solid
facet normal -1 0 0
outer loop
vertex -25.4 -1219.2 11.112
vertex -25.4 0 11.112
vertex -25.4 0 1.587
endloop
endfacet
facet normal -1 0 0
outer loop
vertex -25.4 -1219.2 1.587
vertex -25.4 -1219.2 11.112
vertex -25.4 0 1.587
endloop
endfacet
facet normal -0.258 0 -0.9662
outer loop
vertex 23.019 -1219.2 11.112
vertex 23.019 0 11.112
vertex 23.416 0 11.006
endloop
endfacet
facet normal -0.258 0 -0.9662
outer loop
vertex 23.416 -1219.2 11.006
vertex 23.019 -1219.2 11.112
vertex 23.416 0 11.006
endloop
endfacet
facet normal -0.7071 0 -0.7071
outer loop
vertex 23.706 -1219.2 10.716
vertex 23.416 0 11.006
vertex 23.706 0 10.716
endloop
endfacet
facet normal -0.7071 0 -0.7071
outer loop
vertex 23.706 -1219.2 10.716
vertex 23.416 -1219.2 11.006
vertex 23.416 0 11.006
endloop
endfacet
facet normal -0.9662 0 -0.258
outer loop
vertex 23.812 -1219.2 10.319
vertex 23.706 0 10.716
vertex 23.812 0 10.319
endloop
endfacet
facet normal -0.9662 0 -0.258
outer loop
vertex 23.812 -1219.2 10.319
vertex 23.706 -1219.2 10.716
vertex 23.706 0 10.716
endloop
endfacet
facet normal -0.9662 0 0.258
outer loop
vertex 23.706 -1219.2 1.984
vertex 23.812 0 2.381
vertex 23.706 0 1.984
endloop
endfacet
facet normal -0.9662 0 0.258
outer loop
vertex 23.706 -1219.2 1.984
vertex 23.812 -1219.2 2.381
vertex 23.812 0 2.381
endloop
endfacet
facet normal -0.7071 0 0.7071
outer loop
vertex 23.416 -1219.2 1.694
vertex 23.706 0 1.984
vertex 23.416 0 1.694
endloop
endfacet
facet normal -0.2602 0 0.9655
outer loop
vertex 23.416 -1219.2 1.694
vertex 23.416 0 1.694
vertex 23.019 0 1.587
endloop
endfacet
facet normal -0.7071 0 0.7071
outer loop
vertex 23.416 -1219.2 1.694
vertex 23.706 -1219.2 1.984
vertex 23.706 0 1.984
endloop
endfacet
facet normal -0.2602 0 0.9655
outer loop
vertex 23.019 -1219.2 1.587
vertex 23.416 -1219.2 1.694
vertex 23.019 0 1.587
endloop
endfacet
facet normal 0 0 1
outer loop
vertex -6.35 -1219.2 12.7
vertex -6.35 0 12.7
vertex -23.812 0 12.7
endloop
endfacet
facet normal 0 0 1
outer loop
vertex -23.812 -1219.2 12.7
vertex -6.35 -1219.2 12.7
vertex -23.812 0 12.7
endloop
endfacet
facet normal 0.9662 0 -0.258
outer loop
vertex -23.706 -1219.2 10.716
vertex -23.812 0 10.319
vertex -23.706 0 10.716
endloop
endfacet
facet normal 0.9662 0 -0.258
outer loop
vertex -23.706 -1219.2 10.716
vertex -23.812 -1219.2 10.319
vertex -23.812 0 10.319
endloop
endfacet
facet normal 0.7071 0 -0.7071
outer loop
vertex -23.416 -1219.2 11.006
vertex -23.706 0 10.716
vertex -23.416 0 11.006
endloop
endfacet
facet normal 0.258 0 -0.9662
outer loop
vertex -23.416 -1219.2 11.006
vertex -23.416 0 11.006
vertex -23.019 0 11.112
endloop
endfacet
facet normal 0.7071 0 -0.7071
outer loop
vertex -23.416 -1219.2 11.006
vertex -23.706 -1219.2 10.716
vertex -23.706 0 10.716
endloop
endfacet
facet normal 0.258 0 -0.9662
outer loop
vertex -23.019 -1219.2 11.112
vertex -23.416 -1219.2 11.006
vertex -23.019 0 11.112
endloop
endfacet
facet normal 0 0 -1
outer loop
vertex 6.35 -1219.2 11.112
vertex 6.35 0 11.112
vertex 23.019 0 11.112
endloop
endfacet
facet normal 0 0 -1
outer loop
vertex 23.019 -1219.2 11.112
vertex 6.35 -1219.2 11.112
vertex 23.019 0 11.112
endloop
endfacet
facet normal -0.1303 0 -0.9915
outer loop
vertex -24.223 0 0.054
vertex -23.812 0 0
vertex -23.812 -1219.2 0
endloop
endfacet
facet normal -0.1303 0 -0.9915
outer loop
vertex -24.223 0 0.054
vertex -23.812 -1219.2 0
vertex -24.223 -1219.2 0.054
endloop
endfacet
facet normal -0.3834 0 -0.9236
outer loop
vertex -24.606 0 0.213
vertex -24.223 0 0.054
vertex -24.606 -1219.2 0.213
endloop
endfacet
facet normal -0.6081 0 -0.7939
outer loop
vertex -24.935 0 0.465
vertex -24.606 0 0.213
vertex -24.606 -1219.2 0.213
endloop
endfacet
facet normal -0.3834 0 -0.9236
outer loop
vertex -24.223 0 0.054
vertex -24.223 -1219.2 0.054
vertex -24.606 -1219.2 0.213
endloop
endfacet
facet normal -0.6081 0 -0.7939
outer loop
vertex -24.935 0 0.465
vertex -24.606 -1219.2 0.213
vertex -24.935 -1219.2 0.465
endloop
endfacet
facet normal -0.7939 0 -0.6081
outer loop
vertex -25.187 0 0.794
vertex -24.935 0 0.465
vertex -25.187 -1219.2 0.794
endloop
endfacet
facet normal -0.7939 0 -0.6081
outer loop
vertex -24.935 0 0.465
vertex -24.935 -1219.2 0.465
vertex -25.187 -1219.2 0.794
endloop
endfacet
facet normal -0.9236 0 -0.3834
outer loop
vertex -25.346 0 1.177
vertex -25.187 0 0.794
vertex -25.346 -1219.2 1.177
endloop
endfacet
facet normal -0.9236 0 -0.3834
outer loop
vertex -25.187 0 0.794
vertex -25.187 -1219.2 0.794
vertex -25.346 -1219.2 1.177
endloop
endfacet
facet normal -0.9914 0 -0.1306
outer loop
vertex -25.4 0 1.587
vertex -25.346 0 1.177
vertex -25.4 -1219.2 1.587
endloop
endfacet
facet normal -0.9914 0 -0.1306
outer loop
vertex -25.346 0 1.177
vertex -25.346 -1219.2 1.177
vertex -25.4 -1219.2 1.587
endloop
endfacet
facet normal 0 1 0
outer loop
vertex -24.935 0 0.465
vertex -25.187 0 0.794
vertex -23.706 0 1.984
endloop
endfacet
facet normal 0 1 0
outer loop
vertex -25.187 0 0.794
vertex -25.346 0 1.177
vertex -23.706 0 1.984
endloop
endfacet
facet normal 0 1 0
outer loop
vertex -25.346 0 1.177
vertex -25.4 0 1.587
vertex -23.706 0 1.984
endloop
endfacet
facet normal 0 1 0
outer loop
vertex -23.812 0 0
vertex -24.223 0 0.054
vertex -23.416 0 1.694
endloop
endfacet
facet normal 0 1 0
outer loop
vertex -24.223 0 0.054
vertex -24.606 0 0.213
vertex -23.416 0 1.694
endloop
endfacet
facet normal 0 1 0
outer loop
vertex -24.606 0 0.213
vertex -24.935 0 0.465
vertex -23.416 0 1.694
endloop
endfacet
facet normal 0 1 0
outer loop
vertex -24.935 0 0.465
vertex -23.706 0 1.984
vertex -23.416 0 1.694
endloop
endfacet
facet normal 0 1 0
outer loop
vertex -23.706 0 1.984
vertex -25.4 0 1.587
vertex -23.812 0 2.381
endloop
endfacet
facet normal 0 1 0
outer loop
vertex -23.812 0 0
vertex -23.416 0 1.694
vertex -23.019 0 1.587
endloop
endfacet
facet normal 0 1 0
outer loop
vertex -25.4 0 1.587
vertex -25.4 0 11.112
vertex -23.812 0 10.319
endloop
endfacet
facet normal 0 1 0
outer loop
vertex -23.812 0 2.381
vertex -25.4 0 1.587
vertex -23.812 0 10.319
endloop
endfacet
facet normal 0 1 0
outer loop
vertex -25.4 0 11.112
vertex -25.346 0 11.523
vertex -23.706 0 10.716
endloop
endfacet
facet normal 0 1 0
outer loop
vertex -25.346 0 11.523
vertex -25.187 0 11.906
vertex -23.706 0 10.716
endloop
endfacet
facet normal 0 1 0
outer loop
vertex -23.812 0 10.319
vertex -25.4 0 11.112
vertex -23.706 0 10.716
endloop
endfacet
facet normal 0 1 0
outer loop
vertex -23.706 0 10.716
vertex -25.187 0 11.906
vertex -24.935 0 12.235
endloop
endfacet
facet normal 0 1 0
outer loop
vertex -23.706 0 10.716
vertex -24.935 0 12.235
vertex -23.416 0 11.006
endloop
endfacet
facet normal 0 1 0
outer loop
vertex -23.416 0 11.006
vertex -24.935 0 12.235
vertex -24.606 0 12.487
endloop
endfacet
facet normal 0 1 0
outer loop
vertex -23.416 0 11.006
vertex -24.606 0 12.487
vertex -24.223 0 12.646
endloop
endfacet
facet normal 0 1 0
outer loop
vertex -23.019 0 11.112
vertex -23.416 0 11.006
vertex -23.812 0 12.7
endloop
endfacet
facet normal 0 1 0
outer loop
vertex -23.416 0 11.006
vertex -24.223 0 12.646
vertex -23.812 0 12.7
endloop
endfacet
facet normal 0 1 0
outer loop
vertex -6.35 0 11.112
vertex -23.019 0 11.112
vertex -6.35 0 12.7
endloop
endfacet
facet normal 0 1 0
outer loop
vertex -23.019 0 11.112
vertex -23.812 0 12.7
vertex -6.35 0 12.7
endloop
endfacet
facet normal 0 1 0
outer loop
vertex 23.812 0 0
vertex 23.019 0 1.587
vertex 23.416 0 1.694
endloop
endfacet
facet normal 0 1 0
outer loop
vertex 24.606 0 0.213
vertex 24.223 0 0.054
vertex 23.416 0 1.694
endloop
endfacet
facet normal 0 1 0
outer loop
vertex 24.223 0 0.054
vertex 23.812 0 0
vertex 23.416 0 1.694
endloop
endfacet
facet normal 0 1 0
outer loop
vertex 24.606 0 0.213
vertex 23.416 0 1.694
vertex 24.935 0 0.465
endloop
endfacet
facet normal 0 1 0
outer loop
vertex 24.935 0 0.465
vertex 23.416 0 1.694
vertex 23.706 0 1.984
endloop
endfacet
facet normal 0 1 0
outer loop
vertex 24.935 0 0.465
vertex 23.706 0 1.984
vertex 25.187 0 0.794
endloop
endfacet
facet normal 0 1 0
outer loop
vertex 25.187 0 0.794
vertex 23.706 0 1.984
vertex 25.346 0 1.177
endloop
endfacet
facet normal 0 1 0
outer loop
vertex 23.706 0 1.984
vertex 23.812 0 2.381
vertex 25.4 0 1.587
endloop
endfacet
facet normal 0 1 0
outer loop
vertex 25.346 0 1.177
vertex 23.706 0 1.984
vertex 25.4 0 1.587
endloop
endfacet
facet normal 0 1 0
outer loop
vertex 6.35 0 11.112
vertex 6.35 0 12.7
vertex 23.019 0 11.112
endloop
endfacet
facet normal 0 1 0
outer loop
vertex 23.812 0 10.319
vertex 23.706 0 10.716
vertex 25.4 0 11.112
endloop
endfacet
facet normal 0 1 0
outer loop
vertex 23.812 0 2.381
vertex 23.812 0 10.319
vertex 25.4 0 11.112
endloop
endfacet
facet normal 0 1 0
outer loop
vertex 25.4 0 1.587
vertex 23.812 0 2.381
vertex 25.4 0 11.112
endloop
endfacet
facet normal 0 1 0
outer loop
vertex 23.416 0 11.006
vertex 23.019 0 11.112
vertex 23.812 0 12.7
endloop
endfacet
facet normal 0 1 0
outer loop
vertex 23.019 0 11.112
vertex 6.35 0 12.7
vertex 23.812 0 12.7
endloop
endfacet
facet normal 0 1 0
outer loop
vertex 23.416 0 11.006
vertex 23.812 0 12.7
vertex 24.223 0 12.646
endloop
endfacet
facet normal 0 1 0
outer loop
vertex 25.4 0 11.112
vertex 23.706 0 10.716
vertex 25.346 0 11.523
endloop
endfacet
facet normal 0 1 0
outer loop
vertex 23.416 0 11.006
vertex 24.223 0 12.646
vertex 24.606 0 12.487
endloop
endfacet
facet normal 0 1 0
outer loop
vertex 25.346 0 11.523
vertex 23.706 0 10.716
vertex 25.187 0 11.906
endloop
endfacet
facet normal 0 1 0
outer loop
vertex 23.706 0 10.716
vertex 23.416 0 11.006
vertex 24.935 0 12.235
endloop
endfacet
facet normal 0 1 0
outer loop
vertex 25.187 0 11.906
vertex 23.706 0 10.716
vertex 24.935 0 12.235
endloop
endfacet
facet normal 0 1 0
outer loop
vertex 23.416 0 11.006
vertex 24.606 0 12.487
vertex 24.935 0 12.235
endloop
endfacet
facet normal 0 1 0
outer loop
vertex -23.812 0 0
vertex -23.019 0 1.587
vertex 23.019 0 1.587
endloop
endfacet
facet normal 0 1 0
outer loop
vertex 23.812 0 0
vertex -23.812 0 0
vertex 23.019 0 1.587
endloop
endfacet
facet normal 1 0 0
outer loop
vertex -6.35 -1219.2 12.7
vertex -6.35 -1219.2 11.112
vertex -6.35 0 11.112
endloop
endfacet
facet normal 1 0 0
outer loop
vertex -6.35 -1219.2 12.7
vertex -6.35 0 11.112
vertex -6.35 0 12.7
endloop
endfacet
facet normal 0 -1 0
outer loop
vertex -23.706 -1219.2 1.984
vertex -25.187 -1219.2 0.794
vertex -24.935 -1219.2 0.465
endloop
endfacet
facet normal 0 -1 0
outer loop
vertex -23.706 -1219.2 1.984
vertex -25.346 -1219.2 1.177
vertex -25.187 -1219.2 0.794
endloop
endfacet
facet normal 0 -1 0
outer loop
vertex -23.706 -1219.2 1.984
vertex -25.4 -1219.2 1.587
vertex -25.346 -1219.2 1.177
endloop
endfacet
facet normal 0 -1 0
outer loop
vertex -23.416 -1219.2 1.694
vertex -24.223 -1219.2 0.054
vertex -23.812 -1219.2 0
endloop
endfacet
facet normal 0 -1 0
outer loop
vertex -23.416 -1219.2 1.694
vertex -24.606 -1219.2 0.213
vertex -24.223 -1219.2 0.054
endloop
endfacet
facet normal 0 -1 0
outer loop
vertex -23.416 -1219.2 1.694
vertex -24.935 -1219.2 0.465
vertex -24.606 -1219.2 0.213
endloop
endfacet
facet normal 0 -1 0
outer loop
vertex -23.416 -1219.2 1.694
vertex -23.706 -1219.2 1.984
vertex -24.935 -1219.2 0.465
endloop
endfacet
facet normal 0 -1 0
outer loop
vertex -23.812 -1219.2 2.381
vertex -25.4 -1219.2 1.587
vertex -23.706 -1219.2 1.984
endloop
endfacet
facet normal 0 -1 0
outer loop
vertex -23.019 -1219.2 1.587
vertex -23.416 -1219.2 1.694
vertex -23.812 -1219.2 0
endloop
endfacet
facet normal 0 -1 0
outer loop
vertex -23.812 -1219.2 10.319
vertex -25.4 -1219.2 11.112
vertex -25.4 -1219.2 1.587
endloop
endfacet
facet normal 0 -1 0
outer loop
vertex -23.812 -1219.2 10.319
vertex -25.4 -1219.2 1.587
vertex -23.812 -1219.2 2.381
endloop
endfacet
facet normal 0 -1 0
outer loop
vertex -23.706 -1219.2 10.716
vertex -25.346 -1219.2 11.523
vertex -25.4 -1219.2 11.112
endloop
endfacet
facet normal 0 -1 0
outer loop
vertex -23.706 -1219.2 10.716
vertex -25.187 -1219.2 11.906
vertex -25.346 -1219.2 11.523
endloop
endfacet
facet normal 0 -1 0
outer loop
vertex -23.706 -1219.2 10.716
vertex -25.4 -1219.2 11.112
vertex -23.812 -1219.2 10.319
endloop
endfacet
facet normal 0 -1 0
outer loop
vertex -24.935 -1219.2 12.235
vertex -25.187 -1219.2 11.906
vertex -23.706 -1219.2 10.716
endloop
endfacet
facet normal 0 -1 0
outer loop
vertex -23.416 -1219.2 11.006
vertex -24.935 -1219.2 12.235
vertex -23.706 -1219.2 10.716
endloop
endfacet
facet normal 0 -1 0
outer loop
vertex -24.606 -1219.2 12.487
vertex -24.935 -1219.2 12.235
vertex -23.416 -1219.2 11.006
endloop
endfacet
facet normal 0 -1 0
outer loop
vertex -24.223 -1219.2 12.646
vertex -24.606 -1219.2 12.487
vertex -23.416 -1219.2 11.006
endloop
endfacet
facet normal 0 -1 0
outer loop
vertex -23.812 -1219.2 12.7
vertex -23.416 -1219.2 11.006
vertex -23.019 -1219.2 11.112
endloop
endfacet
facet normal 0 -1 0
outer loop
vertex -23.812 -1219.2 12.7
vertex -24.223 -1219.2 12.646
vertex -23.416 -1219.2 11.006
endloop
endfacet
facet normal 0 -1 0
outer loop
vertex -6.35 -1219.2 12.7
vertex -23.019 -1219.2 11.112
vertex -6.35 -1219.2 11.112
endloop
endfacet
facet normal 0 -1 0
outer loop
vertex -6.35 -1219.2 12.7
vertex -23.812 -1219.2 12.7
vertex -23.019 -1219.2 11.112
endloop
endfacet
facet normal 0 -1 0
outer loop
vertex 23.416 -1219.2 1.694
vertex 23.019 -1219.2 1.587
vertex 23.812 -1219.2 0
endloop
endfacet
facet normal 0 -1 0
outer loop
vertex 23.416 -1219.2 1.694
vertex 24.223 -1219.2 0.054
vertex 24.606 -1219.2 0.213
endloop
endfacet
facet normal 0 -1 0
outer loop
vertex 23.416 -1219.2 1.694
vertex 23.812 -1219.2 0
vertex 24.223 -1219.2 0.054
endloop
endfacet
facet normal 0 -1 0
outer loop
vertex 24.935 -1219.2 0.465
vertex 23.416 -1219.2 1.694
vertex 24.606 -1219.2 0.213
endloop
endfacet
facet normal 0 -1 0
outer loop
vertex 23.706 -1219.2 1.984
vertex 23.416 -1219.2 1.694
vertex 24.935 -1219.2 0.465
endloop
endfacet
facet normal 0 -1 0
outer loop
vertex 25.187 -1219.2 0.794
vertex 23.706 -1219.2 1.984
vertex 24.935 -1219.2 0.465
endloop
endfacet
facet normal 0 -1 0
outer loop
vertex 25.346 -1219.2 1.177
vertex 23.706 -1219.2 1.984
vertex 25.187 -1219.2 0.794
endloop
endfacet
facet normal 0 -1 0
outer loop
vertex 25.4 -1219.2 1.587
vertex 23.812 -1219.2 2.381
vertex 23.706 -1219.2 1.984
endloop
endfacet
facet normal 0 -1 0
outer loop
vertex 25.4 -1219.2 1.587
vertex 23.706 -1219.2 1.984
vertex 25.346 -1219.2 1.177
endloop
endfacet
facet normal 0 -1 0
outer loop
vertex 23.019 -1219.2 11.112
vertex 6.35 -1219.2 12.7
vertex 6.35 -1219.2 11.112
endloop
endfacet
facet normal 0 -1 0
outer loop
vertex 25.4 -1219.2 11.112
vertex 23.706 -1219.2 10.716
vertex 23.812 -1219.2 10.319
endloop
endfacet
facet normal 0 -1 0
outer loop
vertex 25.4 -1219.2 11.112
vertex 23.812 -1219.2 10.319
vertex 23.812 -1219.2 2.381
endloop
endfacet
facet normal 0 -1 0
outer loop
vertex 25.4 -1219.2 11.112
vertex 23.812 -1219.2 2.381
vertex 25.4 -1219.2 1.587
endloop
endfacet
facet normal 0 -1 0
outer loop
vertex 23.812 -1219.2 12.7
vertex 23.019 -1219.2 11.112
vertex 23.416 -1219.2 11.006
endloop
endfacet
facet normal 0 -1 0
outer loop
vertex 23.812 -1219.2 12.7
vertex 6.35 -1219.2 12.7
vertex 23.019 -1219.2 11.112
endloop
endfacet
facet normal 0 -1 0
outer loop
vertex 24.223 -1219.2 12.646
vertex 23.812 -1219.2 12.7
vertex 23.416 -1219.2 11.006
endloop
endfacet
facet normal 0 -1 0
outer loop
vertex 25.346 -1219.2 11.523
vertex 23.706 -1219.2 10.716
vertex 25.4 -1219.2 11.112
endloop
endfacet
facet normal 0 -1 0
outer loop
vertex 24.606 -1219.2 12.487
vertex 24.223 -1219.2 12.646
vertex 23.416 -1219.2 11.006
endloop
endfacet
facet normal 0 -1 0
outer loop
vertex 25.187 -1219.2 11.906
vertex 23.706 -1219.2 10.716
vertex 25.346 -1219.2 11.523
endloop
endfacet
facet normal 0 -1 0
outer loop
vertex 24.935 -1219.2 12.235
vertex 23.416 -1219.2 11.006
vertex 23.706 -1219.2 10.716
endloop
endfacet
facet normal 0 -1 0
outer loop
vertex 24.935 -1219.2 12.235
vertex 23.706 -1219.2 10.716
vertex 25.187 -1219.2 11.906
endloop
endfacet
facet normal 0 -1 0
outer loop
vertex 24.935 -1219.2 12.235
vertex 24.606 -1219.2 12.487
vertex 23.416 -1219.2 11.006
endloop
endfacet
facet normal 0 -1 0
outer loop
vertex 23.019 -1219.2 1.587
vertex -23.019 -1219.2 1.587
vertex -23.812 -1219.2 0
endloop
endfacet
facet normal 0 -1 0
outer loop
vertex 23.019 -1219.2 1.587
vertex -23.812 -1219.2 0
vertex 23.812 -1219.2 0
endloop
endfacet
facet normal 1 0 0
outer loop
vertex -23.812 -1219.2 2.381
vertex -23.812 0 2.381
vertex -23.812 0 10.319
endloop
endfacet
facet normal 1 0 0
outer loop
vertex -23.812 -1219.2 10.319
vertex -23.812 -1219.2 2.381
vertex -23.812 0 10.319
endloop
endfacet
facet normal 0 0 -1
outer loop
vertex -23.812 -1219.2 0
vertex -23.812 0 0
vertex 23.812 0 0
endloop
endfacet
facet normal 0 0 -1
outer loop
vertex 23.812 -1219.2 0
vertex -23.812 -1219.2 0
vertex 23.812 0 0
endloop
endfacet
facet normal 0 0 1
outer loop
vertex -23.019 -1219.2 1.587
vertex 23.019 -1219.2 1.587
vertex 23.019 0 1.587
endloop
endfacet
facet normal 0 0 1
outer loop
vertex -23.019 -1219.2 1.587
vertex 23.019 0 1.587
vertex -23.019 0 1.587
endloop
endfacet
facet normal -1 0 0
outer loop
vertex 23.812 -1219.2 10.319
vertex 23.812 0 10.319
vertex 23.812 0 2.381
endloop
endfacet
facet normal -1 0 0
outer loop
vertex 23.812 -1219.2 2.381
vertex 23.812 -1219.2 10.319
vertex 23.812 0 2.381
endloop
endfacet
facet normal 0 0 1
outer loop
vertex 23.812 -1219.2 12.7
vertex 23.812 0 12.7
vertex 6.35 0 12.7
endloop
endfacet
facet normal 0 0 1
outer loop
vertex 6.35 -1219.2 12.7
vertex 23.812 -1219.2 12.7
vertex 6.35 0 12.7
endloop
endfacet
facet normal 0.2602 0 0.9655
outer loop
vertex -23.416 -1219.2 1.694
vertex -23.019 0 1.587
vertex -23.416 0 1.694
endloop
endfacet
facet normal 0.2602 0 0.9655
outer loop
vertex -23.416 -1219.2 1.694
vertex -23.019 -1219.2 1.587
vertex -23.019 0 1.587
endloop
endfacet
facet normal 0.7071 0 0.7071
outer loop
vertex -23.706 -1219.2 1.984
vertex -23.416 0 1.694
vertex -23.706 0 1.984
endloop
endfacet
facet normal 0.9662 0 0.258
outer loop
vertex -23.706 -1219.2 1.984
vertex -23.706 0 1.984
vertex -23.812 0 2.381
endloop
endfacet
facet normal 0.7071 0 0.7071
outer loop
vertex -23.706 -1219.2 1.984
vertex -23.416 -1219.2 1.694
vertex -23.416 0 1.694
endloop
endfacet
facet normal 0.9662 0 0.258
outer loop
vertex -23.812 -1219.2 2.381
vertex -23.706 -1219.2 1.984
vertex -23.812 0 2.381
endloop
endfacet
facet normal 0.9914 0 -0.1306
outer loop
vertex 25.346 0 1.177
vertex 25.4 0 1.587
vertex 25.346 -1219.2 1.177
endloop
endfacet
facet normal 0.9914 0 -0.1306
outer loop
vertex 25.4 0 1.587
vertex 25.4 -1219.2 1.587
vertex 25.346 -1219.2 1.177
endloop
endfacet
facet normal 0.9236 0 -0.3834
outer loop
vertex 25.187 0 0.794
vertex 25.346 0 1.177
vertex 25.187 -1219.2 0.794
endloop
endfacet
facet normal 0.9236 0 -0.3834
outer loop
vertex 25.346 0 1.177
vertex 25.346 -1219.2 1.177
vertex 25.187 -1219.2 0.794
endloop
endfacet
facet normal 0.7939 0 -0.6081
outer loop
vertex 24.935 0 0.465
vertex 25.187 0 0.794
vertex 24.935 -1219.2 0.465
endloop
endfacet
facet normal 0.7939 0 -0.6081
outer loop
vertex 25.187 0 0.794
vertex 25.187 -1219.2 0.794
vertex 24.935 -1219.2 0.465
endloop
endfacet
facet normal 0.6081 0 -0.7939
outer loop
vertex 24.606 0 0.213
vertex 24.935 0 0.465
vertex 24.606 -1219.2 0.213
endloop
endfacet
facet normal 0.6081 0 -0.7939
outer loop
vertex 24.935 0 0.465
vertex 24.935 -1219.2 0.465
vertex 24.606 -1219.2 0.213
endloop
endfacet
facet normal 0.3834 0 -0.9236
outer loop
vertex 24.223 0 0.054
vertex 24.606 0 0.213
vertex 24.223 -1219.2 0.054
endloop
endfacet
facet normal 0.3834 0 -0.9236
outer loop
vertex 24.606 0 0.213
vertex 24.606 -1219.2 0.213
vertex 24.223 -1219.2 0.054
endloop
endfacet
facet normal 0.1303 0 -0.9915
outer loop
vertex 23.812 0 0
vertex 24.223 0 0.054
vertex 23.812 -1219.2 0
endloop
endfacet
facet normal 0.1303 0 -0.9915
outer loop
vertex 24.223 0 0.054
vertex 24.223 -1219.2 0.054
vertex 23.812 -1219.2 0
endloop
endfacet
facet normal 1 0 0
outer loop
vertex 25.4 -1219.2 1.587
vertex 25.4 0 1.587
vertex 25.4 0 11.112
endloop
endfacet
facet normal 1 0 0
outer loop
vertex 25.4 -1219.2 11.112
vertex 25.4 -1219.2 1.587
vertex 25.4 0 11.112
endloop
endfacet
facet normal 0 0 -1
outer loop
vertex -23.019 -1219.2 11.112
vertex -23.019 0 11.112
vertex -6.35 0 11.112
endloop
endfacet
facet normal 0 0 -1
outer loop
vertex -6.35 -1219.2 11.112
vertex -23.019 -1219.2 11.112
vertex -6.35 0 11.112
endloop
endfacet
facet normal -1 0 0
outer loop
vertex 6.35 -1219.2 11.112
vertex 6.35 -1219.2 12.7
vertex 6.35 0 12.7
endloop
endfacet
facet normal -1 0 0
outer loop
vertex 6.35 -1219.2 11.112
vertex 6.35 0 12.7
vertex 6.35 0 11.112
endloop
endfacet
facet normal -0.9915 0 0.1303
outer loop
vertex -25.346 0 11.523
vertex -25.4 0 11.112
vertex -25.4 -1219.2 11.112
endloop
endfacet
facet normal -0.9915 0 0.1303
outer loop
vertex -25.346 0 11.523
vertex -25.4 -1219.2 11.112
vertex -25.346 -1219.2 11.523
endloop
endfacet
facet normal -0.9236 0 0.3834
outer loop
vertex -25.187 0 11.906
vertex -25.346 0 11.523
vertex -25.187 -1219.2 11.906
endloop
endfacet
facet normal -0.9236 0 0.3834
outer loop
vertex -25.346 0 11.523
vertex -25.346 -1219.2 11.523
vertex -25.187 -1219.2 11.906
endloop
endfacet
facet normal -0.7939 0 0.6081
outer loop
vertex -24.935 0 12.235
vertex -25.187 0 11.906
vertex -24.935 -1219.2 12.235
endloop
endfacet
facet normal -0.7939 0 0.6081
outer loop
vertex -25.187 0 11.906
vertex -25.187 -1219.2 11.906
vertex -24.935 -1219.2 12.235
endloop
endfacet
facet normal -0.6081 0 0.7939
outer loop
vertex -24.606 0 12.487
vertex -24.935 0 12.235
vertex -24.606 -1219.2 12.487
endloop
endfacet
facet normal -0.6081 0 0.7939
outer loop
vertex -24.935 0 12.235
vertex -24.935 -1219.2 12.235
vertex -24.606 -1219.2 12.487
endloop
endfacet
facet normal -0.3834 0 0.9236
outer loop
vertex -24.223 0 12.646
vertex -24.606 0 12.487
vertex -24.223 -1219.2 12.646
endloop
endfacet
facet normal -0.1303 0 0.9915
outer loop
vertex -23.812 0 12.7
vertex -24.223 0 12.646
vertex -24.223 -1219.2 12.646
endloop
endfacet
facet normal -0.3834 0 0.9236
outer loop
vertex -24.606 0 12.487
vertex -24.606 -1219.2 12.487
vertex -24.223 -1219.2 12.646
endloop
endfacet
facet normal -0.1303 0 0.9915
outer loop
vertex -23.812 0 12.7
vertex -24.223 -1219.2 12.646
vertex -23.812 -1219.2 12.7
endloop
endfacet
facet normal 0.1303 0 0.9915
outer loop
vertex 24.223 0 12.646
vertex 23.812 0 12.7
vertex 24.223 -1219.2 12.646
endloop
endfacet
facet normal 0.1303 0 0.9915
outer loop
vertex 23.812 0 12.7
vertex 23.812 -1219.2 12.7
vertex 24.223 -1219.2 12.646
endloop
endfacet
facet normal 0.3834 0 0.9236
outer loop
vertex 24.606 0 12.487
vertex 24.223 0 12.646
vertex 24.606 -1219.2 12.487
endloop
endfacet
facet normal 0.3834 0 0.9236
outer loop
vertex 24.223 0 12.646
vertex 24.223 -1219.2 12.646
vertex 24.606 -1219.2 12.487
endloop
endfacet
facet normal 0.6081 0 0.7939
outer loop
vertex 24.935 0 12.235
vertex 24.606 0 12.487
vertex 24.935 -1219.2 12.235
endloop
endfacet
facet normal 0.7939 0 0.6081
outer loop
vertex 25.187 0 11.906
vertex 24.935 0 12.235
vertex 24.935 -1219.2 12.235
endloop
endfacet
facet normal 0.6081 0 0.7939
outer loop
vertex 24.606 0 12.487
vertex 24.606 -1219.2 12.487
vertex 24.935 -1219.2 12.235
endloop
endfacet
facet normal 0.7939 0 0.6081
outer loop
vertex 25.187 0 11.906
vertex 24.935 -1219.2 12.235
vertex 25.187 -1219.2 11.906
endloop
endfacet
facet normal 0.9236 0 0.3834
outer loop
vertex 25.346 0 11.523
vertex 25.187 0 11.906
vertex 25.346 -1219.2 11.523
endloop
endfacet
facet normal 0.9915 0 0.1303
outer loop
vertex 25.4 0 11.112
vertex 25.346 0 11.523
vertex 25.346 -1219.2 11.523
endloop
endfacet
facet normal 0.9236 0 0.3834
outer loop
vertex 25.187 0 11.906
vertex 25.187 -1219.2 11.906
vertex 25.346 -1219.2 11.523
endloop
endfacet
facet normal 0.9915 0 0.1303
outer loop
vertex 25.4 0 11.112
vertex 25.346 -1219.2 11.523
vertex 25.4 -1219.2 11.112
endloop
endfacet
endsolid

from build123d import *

# Parameters (mm, degrees)
F1_DEPTH = 1219.2
F2_R     = 0.79375
F3_R     = 1.5875


# Not quite as in the source:
# - a feature names something its author has since deleted; it is built from what else it names


with BuildPart() as f1:
    # F0 (on Front) → F1 (new body)
    with BuildSketch(Plane.XZ):
        Polygon((-25.4, 0), (0, 0), (25.4, 0), (25.4, 12.7), (6.35, 12.7), (6.35, 11.1125), (23.8125, 11.1125), (23.8125, 1.5875), (0, 1.5875), (-23.8125, 1.5875), (-23.8125, 11.1125), (-6.35, 11.1125), (-6.35, 12.7), (-25.4, 12.7), align=None)
    extrude(amount=F1_DEPTH)

    # F2
    f2_edges = [f1.edges().sort_by_distance(p)[0] for p in [
        (-23.8125, -609.6, 1.5875),
        (-23.8125, -609.6, 11.1125),
        (23.8125, -609.6, 1.5875),
        (23.8125, -609.6, 11.1125),
    ]]
    fillet(f2_edges, radius=F2_R)

    # F3
    f3_edges = [f1.edges().sort_by_distance(p)[0] for p in [
        (25.4, -609.6, 12.7),
        (25.4, -609.6, 0),
        (-25.4, -609.6, 0),
        (-25.4, -609.6, 12.7),
    ]]
    fillet(f3_edges, radius=F3_R)


solid = f1.part
